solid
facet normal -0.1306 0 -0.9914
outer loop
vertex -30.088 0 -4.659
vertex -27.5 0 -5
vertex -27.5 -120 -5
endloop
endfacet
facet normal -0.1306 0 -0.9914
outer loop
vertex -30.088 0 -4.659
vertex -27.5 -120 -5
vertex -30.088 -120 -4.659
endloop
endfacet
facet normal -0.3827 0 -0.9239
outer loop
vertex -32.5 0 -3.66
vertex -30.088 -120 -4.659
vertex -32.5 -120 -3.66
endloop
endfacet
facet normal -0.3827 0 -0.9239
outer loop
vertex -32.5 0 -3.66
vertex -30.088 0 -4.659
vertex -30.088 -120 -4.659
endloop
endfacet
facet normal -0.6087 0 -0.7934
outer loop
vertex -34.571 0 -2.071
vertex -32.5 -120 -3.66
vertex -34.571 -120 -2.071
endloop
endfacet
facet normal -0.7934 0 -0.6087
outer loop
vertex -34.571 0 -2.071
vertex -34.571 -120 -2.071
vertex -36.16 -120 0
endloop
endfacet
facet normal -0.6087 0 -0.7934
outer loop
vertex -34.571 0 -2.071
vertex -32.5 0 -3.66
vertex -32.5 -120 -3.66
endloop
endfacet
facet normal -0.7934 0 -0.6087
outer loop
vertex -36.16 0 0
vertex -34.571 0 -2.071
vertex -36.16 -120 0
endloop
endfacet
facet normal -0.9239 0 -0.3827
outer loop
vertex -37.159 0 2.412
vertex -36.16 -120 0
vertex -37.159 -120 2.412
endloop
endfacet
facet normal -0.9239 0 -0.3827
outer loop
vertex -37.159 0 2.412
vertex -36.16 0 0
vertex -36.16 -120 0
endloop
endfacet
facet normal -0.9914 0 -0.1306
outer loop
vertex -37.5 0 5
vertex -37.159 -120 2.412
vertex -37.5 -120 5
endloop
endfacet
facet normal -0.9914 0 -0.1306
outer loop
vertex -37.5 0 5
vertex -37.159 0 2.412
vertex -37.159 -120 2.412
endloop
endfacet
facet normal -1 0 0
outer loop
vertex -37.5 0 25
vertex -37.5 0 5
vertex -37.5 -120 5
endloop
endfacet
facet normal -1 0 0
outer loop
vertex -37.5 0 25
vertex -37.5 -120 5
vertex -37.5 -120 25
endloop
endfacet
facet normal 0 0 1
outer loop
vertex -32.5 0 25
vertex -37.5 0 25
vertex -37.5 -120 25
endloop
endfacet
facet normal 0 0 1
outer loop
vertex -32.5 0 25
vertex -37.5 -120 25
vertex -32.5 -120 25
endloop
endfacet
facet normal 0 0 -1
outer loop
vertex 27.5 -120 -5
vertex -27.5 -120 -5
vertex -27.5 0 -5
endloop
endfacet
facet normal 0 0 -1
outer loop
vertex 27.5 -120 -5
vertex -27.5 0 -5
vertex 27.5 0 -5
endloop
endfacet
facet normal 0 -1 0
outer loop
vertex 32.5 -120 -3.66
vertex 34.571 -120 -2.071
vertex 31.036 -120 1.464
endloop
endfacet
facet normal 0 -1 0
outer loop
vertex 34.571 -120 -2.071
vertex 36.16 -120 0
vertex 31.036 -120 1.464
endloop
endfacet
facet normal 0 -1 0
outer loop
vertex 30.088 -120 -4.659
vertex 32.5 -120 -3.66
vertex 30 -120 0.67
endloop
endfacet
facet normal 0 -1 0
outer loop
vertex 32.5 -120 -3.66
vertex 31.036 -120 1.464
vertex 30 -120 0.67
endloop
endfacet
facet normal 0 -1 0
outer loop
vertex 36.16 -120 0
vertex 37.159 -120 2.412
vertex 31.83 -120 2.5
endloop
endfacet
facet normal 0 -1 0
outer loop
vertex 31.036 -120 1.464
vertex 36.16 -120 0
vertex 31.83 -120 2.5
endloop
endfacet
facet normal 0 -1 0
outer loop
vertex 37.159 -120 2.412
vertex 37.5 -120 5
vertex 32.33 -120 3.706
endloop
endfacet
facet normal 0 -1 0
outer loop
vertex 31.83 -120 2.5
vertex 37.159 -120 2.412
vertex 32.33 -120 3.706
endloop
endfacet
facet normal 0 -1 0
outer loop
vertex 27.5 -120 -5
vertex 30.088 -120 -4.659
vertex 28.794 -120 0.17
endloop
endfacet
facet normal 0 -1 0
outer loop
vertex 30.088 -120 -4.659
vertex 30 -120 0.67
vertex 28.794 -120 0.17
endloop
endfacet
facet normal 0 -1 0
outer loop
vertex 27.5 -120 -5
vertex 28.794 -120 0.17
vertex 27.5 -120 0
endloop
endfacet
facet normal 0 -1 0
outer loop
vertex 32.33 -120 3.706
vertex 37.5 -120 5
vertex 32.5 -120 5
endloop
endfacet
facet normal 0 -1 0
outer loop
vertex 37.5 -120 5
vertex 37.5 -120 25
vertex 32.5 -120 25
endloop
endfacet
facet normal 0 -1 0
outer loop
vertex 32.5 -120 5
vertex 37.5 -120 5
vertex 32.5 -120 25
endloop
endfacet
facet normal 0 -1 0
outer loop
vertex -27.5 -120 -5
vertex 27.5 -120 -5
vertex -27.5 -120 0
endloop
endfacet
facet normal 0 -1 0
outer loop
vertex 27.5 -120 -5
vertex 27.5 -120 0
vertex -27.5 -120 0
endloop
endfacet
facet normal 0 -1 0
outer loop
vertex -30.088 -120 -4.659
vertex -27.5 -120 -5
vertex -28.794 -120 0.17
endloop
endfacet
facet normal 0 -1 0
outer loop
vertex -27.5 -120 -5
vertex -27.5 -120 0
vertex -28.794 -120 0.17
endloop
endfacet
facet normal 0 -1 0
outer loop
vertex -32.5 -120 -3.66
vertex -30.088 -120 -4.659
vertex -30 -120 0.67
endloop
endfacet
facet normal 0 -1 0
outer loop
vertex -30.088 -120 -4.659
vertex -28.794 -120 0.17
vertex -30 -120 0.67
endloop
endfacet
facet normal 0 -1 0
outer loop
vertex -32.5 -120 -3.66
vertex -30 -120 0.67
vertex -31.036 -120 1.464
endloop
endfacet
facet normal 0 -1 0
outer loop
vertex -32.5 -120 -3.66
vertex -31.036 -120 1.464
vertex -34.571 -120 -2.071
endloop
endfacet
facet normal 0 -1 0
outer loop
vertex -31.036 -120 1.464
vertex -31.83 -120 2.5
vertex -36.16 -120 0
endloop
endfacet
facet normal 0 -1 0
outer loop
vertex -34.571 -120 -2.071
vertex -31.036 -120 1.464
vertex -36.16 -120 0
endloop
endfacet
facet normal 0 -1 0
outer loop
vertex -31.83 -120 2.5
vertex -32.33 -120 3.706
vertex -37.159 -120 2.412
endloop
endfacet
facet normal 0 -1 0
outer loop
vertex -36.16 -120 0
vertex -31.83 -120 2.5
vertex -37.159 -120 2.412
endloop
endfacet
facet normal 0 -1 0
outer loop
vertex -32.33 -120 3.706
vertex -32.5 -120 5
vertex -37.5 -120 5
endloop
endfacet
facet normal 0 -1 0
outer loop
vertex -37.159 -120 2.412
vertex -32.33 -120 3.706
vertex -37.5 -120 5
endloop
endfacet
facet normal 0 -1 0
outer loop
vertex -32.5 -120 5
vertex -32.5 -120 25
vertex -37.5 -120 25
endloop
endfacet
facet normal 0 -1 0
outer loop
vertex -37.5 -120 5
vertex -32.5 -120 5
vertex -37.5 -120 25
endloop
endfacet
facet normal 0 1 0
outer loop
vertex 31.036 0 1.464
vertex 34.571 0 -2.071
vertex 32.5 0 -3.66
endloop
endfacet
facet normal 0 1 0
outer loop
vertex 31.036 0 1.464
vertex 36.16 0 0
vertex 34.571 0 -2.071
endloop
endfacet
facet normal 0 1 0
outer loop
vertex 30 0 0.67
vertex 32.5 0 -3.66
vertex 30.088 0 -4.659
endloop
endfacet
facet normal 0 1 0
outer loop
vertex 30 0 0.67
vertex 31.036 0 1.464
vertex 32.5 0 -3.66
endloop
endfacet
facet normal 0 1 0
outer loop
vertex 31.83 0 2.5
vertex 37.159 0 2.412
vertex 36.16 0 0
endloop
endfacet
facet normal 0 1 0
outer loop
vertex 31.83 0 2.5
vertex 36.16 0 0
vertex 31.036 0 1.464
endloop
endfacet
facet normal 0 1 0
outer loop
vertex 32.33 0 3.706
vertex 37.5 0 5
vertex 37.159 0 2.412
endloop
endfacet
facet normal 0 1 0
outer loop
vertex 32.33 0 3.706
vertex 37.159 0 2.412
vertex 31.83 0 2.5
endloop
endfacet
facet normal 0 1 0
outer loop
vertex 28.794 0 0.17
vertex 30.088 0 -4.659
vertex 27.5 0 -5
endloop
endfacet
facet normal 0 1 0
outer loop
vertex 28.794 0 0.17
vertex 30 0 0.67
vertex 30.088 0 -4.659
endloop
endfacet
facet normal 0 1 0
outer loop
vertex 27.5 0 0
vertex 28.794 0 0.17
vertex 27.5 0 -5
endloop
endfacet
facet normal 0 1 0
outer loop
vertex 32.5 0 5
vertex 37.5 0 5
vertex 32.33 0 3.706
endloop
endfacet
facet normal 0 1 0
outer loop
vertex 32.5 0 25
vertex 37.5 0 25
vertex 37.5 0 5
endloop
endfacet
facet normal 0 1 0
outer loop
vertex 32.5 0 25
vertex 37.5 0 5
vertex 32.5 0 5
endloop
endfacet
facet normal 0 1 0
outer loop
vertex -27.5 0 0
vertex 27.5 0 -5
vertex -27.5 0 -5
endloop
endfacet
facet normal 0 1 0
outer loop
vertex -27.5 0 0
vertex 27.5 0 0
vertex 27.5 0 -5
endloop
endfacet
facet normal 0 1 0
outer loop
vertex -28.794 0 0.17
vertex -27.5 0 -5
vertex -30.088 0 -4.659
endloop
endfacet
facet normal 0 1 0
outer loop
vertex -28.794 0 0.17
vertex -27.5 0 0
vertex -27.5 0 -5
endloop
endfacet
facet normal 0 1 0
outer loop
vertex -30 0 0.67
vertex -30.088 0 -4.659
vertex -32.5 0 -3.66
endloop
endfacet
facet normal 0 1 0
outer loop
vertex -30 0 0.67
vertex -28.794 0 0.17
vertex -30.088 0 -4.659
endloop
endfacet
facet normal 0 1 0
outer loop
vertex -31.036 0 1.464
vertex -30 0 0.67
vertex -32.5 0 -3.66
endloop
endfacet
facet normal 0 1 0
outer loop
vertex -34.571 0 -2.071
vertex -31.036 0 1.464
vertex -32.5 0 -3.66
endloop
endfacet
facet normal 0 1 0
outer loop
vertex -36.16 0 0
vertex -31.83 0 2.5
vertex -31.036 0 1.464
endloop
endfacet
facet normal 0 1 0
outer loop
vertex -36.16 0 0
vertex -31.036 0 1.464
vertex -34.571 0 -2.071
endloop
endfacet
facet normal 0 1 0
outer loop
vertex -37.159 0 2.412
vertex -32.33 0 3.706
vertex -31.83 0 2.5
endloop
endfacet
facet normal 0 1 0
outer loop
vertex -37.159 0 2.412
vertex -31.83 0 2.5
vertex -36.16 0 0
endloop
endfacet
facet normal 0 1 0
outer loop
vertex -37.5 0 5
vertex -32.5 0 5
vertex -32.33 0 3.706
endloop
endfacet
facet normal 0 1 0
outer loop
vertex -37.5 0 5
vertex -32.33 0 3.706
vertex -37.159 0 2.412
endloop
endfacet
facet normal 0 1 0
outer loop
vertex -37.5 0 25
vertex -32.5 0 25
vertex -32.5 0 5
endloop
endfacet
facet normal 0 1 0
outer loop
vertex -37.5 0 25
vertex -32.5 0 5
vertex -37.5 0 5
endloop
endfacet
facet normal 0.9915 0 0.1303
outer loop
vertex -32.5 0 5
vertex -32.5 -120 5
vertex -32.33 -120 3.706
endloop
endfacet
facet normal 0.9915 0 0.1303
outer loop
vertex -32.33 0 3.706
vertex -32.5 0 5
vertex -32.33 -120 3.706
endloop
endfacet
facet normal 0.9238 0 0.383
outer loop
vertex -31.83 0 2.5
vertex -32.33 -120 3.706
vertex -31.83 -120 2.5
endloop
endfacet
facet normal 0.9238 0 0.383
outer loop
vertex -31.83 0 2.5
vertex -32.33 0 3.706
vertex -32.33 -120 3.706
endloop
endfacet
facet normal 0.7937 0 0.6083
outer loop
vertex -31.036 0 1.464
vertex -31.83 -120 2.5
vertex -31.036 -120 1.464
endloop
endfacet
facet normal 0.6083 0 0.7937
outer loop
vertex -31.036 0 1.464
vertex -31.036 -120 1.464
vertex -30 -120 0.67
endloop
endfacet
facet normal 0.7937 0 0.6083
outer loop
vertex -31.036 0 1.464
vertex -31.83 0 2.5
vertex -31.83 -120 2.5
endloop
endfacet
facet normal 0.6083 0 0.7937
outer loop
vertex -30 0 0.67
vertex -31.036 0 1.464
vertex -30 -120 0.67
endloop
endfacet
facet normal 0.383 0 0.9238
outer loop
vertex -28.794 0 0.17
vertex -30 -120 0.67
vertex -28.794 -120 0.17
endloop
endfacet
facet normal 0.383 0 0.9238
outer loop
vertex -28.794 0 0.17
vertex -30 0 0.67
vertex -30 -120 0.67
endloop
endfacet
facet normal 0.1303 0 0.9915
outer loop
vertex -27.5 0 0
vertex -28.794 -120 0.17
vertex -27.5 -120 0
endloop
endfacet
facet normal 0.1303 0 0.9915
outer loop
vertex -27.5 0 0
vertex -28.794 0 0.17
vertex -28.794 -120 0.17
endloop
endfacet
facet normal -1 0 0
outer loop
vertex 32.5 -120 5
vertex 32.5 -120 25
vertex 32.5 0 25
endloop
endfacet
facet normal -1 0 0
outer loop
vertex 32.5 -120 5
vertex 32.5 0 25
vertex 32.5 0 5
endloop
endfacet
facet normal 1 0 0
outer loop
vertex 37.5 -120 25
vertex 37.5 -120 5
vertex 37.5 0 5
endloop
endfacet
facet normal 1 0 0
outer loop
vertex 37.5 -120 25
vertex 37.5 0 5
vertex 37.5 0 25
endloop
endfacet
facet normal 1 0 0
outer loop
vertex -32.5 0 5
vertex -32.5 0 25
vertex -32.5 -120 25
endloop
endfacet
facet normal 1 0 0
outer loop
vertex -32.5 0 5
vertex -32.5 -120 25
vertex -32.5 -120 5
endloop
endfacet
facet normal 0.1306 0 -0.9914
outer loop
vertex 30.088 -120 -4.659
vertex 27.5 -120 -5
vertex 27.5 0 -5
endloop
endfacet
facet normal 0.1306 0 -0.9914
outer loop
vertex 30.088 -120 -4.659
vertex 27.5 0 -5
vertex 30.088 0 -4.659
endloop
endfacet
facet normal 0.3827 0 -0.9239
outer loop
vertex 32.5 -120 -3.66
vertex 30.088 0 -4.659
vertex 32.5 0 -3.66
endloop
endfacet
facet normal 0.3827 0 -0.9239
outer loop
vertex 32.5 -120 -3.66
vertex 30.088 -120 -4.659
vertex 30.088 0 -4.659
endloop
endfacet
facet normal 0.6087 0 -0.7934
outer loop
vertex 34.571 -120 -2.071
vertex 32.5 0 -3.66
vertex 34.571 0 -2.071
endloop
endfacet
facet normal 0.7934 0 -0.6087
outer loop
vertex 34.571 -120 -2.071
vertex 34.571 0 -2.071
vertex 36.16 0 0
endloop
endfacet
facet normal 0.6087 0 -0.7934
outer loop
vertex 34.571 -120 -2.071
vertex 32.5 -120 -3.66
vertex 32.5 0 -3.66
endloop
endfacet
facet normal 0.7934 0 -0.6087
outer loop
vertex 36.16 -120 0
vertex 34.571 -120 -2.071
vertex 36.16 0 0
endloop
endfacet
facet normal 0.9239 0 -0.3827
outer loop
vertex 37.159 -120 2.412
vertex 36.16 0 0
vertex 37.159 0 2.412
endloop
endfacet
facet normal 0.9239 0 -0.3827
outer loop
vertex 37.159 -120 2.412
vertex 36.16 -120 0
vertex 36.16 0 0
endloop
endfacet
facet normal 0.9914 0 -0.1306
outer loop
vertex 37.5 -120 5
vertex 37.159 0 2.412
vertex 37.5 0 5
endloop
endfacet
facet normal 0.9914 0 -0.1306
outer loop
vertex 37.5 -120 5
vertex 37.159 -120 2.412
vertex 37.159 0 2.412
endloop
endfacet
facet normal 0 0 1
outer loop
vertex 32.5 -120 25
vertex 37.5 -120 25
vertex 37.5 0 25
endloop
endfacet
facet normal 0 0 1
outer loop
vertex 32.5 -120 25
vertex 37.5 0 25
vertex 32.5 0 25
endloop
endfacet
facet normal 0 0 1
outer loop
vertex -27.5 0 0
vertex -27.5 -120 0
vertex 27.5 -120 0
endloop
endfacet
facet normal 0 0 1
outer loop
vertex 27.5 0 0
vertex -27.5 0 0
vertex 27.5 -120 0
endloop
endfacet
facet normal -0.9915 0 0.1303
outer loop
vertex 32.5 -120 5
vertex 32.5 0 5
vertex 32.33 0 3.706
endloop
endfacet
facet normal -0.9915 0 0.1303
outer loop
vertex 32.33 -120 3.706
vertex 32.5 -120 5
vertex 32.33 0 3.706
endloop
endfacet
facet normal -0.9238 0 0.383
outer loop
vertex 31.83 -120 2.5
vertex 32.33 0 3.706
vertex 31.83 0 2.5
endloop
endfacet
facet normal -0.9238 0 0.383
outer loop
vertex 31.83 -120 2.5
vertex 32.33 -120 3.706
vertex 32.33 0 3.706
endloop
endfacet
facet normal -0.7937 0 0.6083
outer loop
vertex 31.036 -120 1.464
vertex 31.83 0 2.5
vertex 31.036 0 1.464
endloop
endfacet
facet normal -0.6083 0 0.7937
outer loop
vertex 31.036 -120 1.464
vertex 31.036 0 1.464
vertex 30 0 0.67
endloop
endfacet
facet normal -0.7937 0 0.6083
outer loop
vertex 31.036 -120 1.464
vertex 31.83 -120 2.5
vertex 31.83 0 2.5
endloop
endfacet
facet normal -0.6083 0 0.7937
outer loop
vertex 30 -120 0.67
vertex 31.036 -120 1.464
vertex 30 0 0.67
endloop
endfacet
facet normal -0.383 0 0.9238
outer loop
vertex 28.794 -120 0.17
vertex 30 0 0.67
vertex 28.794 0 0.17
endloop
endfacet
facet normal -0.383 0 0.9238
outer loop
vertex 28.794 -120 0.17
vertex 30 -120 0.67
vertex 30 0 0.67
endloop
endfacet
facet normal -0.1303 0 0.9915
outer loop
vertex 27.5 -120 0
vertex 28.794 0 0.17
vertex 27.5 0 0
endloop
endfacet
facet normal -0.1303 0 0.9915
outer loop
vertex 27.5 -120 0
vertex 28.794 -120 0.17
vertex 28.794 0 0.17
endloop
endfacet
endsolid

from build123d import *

# Parameters (mm, degrees)
SKETCH1_W                    = 65
SKETCH1_H                    = 120
BASE_FLANGE1_DEPTH           = 5
EDGE_FLANGE1_STRIP_W         = 30
EDGE_FLANGE1_STRIP_H         = 5
EDGE_FLANGE1_STRIP_CUT_DEPTH = 120
EDGE_FLANGE1_DEPTH           = 120
EDGE_FLANGE2_STRIP_W         = 30
EDGE_FLANGE2_STRIP_H         = 5
EDGE_FLANGE2_STRIP_CUT_DEPTH = 120
EDGE_FLANGE2_DEPTH           = 120


# Sheet-metal steps are written as plain solids
with BuildPart() as part:
    # Sketch1 → Base-Flange1 (new body)
    with BuildSketch(Plane.XY):
        with Locations((0, -60)):
            Rectangle(SKETCH1_W, SKETCH1_H)
    extrude(amount=-BASE_FLANGE1_DEPTH)

    # Edge-Flange1 strip (across the edge) → Edge-Flange1 strip cut (cut)
    with BuildSketch(Plane(origin=(32.5, -120, 0), x_dir=(-1, 0, 0), z_dir=(0, 1, 0))):
        with Locations((-10, -2.5)):
            Rectangle(EDGE_FLANGE1_STRIP_W, EDGE_FLANGE1_STRIP_H)
    extrude(amount=EDGE_FLANGE1_STRIP_CUT_DEPTH, mode=Mode.SUBTRACT)

    # Edge-Flange1 section (across the edge) → Edge-Flange1 (add)
    with BuildSketch(Plane(origin=(32.5, -120, 0), x_dir=(-1, 0, 0), z_dir=(0, 1, 0))):
        with BuildLine():
            Line((-5, 5), (-5, 25))
            Line((-5, 25), (0, 25))
            Line((0, 25), (0, 5))
            ThreePointArc((0, 5), (1.464466094, 1.464466094), (5, 0))
            Line((5, 0), (5, -5))
            ThreePointArc((5, -5), (-2.071067812, -2.071067812), (-5, 5))
        make_face()
    extrude(amount=EDGE_FLANGE1_DEPTH)

    # Edge-Flange2 strip (across the edge) → Edge-Flange2 strip cut (cut)
    with BuildSketch(Plane(origin=(-32.5, 0, 0), x_dir=(1, 0, 0), z_dir=(0, -1, 0))):
        with Locations((-10, -2.5)):
            Rectangle(EDGE_FLANGE2_STRIP_W, EDGE_FLANGE2_STRIP_H)
    extrude(amount=EDGE_FLANGE2_STRIP_CUT_DEPTH, mode=Mode.SUBTRACT)

    # Edge-Flange2 section (across the edge) → Edge-Flange2 (add)
    with BuildSketch(Plane(origin=(-32.5, 0, 0), x_dir=(1, 0, 0), z_dir=(0, -1, 0))):
        with BuildLine():
            Line((-5, 5), (-5, 25))
            Line((-5, 25), (0, 25))
            Line((0, 25), (0, 5))
            ThreePointArc((0, 5), (1.464466094, 1.464466094), (5, 0))
            Line((5, 0), (5, -5))
            ThreePointArc((5, -5), (-2.071067812, -2.071067812), (-5, 5))
        make_face()
    extrude(amount=EDGE_FLANGE2_DEPTH)


solid = part.part
